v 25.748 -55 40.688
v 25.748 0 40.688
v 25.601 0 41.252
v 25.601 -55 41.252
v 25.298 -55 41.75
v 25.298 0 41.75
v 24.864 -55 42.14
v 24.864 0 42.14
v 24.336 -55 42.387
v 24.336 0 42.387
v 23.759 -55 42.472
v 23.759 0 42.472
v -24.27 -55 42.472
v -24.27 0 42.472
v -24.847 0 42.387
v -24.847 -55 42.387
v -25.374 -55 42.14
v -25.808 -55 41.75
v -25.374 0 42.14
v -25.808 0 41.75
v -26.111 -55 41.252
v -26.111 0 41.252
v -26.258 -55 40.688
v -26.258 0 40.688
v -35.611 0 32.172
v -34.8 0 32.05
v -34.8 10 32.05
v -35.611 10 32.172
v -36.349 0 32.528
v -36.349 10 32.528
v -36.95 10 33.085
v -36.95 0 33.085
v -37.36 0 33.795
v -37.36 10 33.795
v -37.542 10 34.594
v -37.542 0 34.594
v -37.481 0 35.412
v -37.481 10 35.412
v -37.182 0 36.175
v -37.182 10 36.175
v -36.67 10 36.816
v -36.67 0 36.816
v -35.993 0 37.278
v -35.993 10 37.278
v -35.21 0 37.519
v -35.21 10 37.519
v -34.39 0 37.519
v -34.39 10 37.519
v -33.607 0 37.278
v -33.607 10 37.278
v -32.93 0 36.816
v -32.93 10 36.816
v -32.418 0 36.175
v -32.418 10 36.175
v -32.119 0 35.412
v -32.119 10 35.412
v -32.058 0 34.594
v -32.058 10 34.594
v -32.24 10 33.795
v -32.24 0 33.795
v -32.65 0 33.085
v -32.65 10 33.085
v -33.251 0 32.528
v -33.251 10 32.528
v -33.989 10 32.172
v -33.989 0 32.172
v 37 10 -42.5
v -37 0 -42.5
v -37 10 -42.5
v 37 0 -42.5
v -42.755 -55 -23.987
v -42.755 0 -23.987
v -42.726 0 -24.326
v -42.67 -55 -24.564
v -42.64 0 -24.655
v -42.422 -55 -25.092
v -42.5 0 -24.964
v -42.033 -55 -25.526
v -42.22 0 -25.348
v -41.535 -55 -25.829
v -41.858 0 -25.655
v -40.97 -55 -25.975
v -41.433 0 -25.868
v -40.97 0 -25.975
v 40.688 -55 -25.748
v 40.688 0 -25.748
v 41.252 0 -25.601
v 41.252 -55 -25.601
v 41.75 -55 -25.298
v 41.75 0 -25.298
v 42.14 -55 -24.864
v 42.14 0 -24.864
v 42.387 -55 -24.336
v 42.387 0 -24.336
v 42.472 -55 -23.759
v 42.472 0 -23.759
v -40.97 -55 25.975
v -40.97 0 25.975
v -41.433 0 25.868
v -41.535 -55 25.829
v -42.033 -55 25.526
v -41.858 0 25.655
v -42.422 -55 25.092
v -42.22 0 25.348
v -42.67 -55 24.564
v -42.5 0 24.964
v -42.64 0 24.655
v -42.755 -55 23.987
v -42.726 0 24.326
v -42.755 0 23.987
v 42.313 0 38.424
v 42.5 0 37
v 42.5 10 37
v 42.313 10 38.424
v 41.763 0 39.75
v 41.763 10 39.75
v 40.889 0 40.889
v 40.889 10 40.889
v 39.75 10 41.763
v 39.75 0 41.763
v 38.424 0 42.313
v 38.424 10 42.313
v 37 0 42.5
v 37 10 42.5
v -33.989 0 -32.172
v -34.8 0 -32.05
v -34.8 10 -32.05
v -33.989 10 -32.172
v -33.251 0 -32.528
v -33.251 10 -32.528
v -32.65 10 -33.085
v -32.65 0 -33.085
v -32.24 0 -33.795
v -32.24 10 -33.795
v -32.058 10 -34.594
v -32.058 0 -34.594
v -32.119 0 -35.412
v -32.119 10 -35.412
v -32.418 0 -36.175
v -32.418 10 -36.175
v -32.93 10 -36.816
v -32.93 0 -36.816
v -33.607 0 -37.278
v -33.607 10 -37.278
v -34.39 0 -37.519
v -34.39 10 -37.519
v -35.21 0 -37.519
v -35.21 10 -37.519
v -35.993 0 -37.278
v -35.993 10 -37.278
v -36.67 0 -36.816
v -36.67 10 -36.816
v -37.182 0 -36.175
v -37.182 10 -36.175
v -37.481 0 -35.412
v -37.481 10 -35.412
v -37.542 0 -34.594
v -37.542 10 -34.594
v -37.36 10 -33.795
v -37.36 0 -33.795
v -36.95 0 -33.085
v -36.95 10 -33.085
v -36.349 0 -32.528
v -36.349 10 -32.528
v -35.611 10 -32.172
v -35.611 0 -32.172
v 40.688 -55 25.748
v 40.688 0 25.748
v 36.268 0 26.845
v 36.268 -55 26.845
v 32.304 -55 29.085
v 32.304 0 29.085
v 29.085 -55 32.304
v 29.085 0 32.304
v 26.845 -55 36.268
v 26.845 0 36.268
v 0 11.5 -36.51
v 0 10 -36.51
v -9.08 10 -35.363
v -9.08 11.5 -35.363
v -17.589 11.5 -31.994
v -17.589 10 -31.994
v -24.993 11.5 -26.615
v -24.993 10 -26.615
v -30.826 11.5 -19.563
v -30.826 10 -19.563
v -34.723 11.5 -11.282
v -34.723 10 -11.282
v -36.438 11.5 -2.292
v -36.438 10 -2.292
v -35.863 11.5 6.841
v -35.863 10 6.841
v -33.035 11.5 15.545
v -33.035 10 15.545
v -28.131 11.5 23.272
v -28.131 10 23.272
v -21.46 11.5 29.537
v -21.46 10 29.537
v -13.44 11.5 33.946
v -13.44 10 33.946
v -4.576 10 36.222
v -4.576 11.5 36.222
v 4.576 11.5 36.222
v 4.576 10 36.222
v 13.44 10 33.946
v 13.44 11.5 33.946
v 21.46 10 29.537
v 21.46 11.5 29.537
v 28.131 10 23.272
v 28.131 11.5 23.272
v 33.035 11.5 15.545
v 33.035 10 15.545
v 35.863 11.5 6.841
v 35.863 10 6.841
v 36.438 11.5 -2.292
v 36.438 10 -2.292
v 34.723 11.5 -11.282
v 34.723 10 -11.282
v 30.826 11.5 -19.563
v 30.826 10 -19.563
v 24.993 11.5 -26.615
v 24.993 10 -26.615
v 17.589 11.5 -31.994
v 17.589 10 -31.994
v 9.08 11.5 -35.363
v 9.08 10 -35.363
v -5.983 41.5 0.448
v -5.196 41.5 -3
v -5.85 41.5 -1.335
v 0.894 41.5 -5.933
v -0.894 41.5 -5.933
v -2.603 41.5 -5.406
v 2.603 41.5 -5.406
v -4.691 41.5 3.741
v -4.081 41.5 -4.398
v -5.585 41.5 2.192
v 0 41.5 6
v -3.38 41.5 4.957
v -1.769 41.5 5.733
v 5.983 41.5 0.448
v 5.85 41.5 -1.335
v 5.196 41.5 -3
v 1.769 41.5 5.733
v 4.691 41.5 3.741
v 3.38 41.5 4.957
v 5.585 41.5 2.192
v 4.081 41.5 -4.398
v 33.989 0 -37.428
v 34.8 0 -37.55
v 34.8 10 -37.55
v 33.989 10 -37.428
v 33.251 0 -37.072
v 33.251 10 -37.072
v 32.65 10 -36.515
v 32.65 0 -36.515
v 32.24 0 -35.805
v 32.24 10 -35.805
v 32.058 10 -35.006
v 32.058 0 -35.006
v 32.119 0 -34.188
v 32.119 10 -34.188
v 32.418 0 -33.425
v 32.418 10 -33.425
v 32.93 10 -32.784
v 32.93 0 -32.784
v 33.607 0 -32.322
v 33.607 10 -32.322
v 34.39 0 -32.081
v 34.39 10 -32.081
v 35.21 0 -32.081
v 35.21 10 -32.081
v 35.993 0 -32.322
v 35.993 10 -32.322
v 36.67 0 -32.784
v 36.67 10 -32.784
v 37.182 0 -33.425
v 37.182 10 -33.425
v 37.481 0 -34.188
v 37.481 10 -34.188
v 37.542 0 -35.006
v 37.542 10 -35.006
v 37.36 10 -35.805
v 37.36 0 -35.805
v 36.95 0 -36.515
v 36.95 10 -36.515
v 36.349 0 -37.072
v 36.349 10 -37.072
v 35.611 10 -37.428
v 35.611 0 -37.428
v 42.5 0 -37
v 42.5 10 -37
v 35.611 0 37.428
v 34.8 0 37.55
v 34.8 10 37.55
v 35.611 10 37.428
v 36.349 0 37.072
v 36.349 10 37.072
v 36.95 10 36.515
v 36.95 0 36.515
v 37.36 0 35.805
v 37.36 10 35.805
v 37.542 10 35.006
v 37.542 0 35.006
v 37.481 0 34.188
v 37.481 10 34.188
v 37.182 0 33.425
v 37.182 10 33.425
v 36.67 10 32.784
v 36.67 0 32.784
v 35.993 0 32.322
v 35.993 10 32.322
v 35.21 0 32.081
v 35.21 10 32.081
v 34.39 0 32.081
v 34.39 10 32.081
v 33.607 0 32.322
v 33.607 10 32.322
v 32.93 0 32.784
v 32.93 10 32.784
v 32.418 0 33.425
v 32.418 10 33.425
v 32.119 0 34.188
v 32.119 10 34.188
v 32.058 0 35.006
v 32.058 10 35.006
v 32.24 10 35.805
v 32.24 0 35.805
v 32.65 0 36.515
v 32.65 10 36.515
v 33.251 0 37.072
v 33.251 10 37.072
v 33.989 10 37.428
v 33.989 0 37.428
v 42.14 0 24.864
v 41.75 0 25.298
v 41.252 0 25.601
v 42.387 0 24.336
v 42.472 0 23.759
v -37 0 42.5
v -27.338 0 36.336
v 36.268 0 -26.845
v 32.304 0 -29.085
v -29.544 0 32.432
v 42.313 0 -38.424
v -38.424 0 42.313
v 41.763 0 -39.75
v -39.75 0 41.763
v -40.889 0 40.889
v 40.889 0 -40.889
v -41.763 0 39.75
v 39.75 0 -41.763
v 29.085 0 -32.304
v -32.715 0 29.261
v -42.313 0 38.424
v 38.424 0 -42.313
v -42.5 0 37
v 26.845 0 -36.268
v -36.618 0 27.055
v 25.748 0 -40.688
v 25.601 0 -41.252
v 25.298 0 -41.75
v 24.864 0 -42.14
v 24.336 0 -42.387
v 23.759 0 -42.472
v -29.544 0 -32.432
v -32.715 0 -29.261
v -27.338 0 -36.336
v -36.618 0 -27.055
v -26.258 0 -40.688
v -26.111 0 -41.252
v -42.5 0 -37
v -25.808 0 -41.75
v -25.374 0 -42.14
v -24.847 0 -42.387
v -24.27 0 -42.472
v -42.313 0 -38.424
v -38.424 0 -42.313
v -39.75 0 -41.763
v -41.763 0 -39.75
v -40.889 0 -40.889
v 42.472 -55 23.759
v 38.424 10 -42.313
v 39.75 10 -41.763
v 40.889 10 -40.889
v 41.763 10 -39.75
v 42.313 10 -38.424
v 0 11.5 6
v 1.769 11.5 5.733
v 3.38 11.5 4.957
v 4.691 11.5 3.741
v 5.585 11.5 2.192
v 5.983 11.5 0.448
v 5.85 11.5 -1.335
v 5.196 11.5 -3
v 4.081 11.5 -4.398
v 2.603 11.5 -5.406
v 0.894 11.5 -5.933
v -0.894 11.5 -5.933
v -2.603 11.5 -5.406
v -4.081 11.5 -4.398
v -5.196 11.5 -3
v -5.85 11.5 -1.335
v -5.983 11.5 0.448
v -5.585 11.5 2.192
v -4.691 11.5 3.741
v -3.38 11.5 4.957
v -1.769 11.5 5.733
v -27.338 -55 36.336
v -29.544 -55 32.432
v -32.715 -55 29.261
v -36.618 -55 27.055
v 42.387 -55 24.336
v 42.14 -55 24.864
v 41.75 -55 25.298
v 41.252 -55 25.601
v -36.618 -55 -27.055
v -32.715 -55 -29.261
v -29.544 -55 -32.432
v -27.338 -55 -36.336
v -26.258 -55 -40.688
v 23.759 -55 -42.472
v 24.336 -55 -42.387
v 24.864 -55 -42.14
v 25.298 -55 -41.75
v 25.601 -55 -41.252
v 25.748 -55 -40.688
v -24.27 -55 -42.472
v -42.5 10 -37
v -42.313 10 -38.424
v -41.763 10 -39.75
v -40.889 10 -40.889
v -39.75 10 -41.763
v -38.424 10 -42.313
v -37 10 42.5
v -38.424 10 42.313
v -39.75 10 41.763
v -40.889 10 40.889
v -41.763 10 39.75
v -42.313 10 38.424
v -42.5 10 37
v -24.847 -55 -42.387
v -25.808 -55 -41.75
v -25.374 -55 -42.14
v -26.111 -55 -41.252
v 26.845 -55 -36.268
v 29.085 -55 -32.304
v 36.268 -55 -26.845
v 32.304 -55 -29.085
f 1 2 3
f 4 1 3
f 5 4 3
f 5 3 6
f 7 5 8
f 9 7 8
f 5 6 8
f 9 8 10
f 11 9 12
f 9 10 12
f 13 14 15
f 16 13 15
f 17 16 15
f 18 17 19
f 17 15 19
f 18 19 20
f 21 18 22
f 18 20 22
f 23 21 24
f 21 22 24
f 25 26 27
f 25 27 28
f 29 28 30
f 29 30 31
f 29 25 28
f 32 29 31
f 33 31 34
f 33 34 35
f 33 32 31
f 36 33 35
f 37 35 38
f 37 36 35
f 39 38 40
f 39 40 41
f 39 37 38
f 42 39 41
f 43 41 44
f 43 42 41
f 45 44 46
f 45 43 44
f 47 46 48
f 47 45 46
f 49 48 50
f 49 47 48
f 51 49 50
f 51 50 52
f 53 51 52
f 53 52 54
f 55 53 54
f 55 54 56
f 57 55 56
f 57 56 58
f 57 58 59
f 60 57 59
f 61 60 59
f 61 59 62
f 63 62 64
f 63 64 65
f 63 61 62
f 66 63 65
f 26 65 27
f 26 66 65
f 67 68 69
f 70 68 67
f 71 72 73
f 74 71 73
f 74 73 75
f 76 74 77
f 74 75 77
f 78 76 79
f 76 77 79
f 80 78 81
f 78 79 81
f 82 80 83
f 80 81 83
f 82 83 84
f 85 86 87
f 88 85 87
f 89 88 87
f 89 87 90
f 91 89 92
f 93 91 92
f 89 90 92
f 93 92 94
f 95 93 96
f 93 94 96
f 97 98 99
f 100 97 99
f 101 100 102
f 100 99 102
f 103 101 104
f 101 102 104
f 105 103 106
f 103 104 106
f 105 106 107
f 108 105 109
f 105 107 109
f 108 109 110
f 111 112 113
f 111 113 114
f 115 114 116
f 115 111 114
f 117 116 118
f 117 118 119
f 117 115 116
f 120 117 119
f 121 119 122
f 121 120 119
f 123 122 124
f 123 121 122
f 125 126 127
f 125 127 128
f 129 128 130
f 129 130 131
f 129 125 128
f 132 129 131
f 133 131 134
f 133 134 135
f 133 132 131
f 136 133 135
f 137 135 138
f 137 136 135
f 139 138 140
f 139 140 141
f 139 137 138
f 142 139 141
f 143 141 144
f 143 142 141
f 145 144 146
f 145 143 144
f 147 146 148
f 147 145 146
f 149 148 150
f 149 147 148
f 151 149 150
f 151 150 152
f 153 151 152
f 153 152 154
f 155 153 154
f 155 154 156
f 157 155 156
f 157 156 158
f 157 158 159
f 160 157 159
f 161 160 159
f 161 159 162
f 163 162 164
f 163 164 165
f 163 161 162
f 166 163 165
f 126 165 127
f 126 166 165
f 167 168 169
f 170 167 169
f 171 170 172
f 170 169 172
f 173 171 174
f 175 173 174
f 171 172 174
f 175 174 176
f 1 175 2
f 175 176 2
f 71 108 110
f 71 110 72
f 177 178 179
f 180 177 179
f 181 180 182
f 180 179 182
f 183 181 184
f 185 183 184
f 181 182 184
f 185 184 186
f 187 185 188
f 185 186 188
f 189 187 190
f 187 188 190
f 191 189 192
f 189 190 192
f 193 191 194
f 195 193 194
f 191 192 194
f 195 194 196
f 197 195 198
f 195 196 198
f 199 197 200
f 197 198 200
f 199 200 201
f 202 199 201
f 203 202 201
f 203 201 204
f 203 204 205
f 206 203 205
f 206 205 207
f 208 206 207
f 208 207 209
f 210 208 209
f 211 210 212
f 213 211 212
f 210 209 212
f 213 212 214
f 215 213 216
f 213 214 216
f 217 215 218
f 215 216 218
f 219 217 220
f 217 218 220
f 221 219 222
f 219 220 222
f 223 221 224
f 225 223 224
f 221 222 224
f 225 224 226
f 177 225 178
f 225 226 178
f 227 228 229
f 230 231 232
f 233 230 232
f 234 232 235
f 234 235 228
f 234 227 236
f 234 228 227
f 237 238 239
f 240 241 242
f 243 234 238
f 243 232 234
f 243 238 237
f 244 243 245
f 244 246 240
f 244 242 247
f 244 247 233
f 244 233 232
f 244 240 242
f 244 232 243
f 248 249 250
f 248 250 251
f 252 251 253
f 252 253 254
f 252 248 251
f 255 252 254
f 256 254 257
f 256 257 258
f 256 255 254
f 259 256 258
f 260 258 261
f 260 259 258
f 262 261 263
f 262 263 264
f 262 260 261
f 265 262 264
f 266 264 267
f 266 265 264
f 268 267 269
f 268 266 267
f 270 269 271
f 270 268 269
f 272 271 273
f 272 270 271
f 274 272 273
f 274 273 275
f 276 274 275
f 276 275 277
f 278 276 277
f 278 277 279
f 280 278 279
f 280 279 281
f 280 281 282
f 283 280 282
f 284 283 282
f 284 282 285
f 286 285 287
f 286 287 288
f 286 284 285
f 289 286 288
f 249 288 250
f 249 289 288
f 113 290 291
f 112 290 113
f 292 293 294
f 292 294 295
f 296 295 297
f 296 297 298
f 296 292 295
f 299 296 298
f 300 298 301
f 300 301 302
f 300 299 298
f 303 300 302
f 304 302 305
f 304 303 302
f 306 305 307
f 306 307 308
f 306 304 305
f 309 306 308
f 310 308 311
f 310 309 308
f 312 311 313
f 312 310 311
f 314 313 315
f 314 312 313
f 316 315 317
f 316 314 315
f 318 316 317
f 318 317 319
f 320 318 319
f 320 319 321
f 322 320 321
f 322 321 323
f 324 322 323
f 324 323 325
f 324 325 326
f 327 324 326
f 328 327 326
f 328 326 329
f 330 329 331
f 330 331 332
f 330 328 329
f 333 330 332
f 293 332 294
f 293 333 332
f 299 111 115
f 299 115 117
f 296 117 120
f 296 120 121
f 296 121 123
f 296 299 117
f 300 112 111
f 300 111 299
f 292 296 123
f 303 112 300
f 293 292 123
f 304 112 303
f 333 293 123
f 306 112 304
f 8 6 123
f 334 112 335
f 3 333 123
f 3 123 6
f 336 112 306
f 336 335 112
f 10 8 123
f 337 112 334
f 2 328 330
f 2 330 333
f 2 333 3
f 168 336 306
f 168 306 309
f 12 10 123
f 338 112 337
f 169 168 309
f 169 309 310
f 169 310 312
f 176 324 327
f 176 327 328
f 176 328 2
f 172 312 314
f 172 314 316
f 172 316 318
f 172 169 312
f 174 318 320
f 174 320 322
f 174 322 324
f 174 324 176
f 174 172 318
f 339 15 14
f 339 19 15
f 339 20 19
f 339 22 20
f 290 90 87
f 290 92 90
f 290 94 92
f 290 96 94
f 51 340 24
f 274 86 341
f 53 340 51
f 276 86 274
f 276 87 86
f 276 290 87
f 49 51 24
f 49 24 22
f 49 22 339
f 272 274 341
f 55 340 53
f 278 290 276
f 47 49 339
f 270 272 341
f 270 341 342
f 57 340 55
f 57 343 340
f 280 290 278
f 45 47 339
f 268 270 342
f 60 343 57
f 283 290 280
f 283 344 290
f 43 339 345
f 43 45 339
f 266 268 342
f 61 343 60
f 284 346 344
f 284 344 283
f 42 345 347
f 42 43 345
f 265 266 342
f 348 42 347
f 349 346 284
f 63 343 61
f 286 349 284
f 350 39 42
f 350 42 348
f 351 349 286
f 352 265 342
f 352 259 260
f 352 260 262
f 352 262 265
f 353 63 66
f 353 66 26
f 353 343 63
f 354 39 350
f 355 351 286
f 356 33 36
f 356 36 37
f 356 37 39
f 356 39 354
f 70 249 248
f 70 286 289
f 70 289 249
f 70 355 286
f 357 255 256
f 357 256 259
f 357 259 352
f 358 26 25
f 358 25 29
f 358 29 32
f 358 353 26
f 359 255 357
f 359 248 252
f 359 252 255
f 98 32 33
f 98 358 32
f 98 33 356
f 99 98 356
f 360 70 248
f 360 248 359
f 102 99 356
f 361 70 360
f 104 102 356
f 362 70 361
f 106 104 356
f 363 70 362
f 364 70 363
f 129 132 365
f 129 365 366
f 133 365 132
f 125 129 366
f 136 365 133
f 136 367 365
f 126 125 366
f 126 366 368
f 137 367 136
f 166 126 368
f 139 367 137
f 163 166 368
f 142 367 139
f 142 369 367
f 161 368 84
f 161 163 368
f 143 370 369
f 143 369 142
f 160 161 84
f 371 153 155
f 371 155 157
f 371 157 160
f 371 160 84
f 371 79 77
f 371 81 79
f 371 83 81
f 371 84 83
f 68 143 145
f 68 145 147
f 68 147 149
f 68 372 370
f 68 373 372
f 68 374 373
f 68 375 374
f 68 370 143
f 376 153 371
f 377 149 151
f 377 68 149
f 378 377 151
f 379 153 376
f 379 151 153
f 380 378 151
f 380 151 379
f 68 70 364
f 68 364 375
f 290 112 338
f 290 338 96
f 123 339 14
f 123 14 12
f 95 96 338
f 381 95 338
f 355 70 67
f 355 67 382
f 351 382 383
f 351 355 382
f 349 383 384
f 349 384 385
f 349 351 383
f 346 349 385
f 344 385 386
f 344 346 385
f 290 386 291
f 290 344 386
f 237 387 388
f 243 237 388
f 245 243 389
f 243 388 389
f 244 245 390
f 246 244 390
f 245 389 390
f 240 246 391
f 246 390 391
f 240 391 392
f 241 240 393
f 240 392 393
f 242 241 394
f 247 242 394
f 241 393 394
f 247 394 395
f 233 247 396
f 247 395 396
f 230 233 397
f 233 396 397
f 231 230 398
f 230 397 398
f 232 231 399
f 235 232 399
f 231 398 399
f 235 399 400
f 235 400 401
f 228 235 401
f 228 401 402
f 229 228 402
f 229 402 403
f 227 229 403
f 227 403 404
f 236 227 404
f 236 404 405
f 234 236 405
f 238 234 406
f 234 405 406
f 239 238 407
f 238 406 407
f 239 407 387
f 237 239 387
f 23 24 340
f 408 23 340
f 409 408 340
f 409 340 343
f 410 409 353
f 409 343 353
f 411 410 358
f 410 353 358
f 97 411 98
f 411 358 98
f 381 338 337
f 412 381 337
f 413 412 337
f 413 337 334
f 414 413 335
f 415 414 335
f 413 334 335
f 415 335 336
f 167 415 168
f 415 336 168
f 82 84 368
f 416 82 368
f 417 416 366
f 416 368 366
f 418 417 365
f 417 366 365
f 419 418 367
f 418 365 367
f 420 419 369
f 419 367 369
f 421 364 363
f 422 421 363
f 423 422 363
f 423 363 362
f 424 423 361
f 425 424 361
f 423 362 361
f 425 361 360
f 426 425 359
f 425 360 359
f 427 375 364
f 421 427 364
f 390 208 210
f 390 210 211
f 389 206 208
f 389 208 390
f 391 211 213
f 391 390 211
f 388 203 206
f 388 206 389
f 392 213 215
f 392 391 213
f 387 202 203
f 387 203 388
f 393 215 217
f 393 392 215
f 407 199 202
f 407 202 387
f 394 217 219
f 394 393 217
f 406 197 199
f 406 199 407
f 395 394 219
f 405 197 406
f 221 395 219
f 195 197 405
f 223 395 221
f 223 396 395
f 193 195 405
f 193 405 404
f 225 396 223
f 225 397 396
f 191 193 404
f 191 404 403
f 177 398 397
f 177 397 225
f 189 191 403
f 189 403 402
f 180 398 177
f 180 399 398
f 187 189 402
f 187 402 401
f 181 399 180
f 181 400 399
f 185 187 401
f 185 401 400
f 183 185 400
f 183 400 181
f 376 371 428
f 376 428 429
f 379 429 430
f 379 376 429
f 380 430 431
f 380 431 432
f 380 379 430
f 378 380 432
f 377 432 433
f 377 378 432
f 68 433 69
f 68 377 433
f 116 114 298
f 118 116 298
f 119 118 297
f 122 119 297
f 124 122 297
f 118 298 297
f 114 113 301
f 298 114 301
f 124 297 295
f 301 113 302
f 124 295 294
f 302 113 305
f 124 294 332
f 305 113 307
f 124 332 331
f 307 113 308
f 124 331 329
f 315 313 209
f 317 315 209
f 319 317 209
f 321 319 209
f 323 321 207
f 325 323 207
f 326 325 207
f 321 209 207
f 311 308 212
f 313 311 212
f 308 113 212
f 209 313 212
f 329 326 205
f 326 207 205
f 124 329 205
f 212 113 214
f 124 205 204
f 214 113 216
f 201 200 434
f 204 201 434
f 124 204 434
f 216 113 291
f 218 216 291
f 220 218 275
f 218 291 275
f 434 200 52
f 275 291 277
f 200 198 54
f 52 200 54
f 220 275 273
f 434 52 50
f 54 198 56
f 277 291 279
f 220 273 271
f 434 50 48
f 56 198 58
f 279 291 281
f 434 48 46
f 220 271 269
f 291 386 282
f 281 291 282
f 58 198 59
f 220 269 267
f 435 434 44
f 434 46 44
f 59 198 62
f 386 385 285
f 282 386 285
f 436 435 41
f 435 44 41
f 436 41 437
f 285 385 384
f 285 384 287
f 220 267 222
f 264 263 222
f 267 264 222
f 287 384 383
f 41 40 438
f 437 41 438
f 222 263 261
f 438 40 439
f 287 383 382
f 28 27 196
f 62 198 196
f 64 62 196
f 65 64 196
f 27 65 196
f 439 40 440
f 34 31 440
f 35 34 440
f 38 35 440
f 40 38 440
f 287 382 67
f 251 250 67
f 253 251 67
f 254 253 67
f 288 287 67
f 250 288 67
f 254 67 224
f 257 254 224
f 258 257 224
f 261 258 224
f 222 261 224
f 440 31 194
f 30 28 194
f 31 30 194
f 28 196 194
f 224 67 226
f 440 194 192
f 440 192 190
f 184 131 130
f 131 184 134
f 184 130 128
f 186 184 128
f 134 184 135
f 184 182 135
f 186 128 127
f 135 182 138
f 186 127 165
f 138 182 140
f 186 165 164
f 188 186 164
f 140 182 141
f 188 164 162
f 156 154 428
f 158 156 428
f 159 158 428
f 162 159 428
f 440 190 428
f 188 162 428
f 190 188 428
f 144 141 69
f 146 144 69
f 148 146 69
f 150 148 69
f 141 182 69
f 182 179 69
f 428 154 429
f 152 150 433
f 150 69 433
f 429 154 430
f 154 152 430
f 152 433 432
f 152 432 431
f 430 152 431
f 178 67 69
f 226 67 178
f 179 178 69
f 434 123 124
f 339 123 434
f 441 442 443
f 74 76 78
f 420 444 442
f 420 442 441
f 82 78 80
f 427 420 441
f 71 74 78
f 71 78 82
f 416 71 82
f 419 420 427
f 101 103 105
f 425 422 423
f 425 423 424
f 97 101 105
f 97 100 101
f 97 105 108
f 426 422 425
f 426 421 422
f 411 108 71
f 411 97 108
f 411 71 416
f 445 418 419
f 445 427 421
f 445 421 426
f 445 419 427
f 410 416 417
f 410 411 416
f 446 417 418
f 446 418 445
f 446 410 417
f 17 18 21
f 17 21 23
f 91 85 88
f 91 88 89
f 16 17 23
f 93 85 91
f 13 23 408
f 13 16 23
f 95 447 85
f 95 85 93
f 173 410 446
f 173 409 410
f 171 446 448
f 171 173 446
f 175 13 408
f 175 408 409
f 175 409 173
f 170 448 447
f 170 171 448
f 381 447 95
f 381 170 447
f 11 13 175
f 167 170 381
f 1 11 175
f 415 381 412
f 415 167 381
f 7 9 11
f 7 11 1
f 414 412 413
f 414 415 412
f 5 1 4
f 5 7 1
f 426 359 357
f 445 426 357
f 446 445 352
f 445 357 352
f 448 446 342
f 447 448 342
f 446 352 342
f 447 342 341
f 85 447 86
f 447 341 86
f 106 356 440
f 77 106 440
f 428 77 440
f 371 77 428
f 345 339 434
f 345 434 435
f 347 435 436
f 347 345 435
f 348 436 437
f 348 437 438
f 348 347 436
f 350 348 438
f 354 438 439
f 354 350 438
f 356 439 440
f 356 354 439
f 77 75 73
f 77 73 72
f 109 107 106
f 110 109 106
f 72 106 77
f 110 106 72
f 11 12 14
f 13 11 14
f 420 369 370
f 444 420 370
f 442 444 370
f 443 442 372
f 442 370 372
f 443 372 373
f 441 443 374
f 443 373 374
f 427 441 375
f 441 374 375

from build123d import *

# Parameters (mm, degrees)
SKETCH_1_R      = 2.75
EXTRUDE_1_DEPTH = 10
SKETCH_2_R      = 36.51
EXTRUDE_2_DEPTH = 1.5
SKETCH_3_R      = 6
EXTRUDE_3_DEPTH = 30
EXTRUDE_4_DEPTH = 55


with BuildPart() as part:
    # Эскиз1 → Вытянуть1 (new body)
    with BuildSketch(Plane(origin=(0, 0, 0), x_dir=(1, 0, 0), z_dir=(0, 1, 0))):
        with BuildLine():
            Line((-37, 42.5), (37, 42.5))
            ThreePointArc((37, 42.5), (40.889087297, 40.889087297), (42.5, 37))
            Line((42.5, 37), (42.5, -37))
            ThreePointArc((42.5, -37), (40.889087297, -40.889087297), (37, -42.5))
            Line((37, -42.5), (-37, -42.5))
            ThreePointArc((-37, -42.5), (-40.889087297, -40.889087297), (-42.5, -37))
            Line((-42.5, -37), (-42.5, 37))
            ThreePointArc((-42.5, 37), (-40.889087297, 40.889087297), (-37, 42.5))
        make_face()
        with Locations(Location((-34.8, 34.8, 0), (0, 0, 270))):
            Circle(SKETCH_1_R, mode=Mode.SUBTRACT)
        with Locations(Location((34.8, 34.8, 0), (0, 0, 90))):
            Circle(SKETCH_1_R, mode=Mode.SUBTRACT)
        with Locations(Location((34.8, -34.8, 0), (0, 0, 270))):
            Circle(SKETCH_1_R, mode=Mode.SUBTRACT)
        with Locations(Location((-34.8, -34.8, 0), (0, 0, 90))):
            Circle(SKETCH_1_R, mode=Mode.SUBTRACT)
    extrude(amount=EXTRUDE_1_DEPTH)

    # Эскиз2 → Вытянуть2 (add)
    with BuildSketch(Plane(origin=(0, 10, 0), x_dir=(1, 0, 0), z_dir=(0, 1, 0))):
        with Locations(Location((0, 0, 0), (0, 0, 90))):
            Circle(SKETCH_2_R)
    extrude(amount=EXTRUDE_2_DEPTH)

    # Эскиз3 → Вытянуть3 (add)
    with BuildSketch(Plane(origin=(0, 11.5, 0), x_dir=(1, 0, 0), z_dir=(0, 1, 0))):
        with Locations(Location((0, 0, 0), (0, 0, 270))):
            Circle(SKETCH_3_R)
    extrude(amount=EXTRUDE_3_DEPTH)

    # Эскиз4 → Вытянуть4 (add)
    with BuildSketch(Plane.XZ):
        with BuildLine():
            Line((-42.755134635, 23.986897935), (-42.755134635, -23.986897935))
            ThreePointArc((-42.755134635, -23.986897935), (-42.243466041, -25.322888065), (-40.970265008, -25.975294003))
            ThreePointArc((-40.970265008, -25.975294003), (-31.02184563, -30.739107233), (-26.258032399, -40.687526612))
            ThreePointArc((-26.258032399, -40.687526612), (-25.605626461, -41.960727645), (-24.269636331, -42.472396239))
            Line((-24.269636331, -42.472396239), (23.75936706, -42.472396239))
            ThreePointArc((23.75936706, -42.472396239), (25.09535719, -41.960727645), (25.747763128, -40.687526612))
            ThreePointArc((25.747763128, -40.687526612), (30.585250737, -30.585250737), (40.687526612, -25.747763128))
            ThreePointArc((40.687526612, -25.747763128), (41.960727645, -25.09535719), (42.472396239, -23.75936706))
            Line((42.472396239, -23.75936706), (42.472396239, 23.75936706))
            ThreePointArc((42.472396239, 23.75936706), (41.960727645, 25.09535719), (40.687526612, 25.747763128))
            ThreePointArc((40.687526612, 25.747763128), (30.585250737, 30.585250737), (25.747763128, 40.687526612))
            ThreePointArc((25.747763128, 40.687526612), (25.09535719, 41.960727645), (23.75936706, 42.472396239))
            Line((23.75936706, 42.472396239), (-24.269636331, 42.472396239))
            ThreePointArc((-24.269636331, 42.472396239), (-25.605626461, 41.960727645), (-26.258032399, 40.687526612))
            ThreePointArc((-26.258032399, 40.687526612), (-31.02184563, 30.739107233), (-40.970265008, 25.975294003))
            ThreePointArc((-40.970265008, 25.975294003), (-42.243466041, 25.322888065), (-42.755134635, 23.986897935))
        make_face()
    extrude(amount=EXTRUDE_4_DEPTH)


solid = part.part
